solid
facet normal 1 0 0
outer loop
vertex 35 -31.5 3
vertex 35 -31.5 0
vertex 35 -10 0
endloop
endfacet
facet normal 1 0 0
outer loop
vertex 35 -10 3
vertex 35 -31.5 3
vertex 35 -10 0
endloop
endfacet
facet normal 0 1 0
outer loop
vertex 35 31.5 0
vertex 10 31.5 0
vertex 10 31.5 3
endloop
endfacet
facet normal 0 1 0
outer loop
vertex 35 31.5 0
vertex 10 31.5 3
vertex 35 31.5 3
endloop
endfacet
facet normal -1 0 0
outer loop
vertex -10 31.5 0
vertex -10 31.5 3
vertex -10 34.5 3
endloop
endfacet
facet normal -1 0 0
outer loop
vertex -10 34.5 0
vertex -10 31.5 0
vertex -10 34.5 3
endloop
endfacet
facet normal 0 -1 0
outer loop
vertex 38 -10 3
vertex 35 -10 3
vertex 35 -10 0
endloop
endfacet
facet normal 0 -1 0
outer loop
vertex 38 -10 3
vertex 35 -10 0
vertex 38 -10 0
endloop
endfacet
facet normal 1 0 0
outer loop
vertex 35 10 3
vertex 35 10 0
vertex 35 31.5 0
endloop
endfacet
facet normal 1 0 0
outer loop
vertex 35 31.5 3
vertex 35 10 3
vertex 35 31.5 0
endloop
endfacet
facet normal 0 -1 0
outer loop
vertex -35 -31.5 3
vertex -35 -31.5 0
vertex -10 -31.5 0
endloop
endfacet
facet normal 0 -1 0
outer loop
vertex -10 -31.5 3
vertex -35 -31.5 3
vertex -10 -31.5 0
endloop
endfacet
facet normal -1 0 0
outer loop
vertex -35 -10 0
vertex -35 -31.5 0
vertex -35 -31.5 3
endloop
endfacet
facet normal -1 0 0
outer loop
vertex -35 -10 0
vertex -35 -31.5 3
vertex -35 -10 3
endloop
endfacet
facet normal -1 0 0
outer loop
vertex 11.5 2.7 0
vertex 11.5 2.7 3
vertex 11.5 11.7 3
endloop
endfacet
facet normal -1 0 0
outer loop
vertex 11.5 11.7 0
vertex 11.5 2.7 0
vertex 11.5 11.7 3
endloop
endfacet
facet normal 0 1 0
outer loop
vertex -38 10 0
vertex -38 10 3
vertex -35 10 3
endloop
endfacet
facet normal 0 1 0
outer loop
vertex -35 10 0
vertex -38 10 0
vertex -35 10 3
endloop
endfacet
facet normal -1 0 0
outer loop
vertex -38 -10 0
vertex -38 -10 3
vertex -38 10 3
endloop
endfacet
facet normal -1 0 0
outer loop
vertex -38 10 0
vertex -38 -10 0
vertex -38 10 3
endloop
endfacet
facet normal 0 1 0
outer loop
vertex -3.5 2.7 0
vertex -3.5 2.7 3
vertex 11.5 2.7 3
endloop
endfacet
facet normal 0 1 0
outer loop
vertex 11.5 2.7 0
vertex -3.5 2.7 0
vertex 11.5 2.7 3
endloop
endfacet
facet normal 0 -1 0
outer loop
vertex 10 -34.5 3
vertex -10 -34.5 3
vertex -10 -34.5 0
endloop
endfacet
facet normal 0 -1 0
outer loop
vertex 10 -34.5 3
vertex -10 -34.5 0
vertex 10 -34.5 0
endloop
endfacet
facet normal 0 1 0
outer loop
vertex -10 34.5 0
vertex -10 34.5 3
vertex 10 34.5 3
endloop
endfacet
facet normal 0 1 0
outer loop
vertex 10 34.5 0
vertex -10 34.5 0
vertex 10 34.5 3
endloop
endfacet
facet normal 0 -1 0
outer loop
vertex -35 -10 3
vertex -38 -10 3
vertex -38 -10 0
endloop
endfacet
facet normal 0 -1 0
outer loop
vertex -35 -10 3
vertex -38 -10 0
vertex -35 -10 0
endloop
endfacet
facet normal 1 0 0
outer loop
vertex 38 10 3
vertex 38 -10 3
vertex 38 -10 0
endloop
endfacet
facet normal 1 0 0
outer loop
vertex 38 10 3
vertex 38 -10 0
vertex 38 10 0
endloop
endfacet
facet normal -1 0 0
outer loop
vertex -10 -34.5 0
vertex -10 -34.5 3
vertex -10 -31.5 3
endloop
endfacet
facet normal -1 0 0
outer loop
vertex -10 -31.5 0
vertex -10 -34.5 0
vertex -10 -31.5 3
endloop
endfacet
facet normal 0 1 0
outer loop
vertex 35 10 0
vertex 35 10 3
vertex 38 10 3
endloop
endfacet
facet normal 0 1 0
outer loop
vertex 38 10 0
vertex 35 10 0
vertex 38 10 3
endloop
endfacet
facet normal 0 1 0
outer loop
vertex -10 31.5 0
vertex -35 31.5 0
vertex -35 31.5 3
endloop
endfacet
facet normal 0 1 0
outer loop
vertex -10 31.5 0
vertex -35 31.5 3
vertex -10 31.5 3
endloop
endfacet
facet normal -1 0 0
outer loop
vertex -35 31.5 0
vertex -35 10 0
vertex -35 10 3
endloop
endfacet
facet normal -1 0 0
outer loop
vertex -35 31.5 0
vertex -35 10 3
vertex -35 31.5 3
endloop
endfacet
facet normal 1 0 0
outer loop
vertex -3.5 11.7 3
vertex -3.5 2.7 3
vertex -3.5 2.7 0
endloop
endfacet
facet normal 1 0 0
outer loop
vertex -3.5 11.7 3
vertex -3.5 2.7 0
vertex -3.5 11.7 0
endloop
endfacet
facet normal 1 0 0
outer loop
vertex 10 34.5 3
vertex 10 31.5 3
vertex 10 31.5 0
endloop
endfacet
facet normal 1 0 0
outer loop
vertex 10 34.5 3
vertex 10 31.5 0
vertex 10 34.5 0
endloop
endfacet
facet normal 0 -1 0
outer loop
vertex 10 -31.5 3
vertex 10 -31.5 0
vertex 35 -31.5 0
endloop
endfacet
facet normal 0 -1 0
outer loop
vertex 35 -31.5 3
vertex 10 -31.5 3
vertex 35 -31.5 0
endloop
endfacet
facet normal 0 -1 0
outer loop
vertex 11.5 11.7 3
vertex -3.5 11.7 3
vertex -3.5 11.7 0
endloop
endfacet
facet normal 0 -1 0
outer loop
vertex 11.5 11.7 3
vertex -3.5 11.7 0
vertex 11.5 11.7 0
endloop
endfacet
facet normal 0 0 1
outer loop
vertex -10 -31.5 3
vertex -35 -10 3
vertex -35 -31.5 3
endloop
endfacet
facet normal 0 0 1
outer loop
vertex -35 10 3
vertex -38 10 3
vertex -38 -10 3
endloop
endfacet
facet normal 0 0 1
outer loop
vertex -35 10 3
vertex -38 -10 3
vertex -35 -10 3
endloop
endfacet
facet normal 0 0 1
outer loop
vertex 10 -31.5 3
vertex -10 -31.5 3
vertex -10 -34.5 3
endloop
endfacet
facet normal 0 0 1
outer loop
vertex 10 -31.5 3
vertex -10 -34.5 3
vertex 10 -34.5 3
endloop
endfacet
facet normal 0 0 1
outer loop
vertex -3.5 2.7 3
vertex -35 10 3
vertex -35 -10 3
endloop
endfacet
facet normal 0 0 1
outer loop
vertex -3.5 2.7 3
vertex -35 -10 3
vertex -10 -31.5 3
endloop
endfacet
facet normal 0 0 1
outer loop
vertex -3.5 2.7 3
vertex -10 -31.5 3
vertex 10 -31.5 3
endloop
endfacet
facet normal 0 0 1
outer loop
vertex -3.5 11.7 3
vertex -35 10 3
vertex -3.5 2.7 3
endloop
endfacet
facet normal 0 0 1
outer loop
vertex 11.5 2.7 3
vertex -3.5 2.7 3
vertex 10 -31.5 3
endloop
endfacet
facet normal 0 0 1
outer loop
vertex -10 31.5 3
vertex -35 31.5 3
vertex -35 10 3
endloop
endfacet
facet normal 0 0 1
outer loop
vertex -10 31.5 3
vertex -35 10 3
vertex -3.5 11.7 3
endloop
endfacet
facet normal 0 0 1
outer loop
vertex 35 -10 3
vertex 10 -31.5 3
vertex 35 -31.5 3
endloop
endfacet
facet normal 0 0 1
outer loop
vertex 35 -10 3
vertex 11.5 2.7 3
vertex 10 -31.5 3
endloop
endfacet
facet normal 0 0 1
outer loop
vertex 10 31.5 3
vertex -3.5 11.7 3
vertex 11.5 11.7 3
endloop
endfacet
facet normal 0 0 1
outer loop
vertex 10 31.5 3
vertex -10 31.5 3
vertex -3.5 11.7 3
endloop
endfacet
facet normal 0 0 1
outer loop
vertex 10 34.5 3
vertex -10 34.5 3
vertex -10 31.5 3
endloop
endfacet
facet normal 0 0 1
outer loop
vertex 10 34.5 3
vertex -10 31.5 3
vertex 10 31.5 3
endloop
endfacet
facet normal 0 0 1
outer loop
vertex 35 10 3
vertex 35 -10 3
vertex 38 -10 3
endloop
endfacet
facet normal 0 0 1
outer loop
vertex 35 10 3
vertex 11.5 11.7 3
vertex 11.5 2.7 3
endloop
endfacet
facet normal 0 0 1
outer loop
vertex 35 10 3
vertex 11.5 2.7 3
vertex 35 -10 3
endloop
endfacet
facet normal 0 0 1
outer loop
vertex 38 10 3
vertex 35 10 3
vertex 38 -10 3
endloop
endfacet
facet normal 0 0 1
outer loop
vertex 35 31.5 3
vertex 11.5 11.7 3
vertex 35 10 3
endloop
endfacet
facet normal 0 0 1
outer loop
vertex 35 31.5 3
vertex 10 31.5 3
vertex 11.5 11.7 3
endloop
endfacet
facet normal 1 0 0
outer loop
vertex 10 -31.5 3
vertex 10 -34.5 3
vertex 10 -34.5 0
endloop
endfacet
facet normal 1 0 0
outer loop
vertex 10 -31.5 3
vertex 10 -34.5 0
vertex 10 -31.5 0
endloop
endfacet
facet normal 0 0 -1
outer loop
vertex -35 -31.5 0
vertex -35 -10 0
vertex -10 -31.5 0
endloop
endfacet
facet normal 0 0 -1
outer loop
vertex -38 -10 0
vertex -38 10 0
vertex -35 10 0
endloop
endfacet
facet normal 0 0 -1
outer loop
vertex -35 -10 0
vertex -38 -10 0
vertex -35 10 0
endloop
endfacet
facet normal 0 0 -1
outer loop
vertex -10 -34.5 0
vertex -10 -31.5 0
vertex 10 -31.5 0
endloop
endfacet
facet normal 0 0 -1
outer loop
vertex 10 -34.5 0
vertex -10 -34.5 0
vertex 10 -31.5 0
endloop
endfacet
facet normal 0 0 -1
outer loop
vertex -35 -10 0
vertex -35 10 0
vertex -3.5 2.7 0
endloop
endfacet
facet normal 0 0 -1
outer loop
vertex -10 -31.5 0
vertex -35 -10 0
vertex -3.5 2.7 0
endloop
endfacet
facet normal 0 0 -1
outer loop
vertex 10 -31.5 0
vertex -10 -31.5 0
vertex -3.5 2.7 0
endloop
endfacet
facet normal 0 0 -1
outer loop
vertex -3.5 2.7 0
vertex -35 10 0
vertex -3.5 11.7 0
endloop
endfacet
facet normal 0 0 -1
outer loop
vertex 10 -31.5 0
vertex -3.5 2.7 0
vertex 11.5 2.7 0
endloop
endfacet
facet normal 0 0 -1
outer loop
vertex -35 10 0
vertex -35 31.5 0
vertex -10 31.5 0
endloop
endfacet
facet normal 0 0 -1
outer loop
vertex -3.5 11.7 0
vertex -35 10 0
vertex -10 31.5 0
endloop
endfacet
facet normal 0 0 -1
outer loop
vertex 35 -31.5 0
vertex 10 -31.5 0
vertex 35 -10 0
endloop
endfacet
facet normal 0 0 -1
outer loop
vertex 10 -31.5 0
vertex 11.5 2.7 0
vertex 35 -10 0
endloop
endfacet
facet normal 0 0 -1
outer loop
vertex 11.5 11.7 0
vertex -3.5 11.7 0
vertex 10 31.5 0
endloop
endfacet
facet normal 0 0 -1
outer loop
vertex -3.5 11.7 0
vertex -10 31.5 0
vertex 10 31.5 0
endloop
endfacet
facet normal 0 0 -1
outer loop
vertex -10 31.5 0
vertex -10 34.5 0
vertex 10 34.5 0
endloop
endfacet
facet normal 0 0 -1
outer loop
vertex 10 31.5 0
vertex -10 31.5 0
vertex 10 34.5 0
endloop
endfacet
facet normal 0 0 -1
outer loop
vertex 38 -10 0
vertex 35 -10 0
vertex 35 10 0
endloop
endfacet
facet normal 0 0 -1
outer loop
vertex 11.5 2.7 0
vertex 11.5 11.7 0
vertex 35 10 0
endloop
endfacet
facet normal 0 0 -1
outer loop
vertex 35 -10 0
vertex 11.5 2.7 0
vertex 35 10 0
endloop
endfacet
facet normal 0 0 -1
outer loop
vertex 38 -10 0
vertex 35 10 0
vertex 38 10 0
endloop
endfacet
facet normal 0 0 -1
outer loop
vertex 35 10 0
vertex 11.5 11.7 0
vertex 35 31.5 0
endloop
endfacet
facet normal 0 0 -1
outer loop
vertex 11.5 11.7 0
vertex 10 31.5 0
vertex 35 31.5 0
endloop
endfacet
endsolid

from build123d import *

# Parameters (mm, degrees)
SKETCH1_W           = 70
SKETCH1_H           = 63
BOSS_EXTRUDE1_DEPTH = 3
SKETCH2_W           = 15
SKETCH2_H           = 9
CUT_EXTRUDE1_DEPTH  = 3
SKETCH4_W           = 3
SKETCH4_H           = 20
SKETCH4_W_2         = 20
SKETCH4_H_2         = 3
BOSS_EXTRUDE2_DEPTH = 3


with BuildPart() as part:
    # Sketch1 → Boss-Extrude1 (new body)
    with BuildSketch(Plane.XY):
        Rectangle(SKETCH1_W, SKETCH1_H)
    extrude(amount=BOSS_EXTRUDE1_DEPTH)

    # Sketch2 → Cut-Extrude1 (cut)
    with BuildSketch(Plane.XY.offset(3)):
        with Locations((4, 7.2)):
            Rectangle(SKETCH2_W, SKETCH2_H)
    extrude(amount=-CUT_EXTRUDE1_DEPTH, mode=Mode.SUBTRACT)

    # Sketch4 → Boss-Extrude2 (add)
    with BuildSketch(Plane.XY.offset(3)):
        with Locations((36.5, 0)):
            Rectangle(SKETCH4_W, SKETCH4_H)
        with Locations((-36.5, 0)):
            Rectangle(SKETCH4_W, SKETCH4_H)
        with Locations((0, 33)):
            Rectangle(SKETCH4_W_2, SKETCH4_H_2)
        with Locations((0, -33)):
            Rectangle(SKETCH4_W_2, SKETCH4_H_2)
    extrude(amount=-BOSS_EXTRUDE2_DEPTH)


solid = part.part
